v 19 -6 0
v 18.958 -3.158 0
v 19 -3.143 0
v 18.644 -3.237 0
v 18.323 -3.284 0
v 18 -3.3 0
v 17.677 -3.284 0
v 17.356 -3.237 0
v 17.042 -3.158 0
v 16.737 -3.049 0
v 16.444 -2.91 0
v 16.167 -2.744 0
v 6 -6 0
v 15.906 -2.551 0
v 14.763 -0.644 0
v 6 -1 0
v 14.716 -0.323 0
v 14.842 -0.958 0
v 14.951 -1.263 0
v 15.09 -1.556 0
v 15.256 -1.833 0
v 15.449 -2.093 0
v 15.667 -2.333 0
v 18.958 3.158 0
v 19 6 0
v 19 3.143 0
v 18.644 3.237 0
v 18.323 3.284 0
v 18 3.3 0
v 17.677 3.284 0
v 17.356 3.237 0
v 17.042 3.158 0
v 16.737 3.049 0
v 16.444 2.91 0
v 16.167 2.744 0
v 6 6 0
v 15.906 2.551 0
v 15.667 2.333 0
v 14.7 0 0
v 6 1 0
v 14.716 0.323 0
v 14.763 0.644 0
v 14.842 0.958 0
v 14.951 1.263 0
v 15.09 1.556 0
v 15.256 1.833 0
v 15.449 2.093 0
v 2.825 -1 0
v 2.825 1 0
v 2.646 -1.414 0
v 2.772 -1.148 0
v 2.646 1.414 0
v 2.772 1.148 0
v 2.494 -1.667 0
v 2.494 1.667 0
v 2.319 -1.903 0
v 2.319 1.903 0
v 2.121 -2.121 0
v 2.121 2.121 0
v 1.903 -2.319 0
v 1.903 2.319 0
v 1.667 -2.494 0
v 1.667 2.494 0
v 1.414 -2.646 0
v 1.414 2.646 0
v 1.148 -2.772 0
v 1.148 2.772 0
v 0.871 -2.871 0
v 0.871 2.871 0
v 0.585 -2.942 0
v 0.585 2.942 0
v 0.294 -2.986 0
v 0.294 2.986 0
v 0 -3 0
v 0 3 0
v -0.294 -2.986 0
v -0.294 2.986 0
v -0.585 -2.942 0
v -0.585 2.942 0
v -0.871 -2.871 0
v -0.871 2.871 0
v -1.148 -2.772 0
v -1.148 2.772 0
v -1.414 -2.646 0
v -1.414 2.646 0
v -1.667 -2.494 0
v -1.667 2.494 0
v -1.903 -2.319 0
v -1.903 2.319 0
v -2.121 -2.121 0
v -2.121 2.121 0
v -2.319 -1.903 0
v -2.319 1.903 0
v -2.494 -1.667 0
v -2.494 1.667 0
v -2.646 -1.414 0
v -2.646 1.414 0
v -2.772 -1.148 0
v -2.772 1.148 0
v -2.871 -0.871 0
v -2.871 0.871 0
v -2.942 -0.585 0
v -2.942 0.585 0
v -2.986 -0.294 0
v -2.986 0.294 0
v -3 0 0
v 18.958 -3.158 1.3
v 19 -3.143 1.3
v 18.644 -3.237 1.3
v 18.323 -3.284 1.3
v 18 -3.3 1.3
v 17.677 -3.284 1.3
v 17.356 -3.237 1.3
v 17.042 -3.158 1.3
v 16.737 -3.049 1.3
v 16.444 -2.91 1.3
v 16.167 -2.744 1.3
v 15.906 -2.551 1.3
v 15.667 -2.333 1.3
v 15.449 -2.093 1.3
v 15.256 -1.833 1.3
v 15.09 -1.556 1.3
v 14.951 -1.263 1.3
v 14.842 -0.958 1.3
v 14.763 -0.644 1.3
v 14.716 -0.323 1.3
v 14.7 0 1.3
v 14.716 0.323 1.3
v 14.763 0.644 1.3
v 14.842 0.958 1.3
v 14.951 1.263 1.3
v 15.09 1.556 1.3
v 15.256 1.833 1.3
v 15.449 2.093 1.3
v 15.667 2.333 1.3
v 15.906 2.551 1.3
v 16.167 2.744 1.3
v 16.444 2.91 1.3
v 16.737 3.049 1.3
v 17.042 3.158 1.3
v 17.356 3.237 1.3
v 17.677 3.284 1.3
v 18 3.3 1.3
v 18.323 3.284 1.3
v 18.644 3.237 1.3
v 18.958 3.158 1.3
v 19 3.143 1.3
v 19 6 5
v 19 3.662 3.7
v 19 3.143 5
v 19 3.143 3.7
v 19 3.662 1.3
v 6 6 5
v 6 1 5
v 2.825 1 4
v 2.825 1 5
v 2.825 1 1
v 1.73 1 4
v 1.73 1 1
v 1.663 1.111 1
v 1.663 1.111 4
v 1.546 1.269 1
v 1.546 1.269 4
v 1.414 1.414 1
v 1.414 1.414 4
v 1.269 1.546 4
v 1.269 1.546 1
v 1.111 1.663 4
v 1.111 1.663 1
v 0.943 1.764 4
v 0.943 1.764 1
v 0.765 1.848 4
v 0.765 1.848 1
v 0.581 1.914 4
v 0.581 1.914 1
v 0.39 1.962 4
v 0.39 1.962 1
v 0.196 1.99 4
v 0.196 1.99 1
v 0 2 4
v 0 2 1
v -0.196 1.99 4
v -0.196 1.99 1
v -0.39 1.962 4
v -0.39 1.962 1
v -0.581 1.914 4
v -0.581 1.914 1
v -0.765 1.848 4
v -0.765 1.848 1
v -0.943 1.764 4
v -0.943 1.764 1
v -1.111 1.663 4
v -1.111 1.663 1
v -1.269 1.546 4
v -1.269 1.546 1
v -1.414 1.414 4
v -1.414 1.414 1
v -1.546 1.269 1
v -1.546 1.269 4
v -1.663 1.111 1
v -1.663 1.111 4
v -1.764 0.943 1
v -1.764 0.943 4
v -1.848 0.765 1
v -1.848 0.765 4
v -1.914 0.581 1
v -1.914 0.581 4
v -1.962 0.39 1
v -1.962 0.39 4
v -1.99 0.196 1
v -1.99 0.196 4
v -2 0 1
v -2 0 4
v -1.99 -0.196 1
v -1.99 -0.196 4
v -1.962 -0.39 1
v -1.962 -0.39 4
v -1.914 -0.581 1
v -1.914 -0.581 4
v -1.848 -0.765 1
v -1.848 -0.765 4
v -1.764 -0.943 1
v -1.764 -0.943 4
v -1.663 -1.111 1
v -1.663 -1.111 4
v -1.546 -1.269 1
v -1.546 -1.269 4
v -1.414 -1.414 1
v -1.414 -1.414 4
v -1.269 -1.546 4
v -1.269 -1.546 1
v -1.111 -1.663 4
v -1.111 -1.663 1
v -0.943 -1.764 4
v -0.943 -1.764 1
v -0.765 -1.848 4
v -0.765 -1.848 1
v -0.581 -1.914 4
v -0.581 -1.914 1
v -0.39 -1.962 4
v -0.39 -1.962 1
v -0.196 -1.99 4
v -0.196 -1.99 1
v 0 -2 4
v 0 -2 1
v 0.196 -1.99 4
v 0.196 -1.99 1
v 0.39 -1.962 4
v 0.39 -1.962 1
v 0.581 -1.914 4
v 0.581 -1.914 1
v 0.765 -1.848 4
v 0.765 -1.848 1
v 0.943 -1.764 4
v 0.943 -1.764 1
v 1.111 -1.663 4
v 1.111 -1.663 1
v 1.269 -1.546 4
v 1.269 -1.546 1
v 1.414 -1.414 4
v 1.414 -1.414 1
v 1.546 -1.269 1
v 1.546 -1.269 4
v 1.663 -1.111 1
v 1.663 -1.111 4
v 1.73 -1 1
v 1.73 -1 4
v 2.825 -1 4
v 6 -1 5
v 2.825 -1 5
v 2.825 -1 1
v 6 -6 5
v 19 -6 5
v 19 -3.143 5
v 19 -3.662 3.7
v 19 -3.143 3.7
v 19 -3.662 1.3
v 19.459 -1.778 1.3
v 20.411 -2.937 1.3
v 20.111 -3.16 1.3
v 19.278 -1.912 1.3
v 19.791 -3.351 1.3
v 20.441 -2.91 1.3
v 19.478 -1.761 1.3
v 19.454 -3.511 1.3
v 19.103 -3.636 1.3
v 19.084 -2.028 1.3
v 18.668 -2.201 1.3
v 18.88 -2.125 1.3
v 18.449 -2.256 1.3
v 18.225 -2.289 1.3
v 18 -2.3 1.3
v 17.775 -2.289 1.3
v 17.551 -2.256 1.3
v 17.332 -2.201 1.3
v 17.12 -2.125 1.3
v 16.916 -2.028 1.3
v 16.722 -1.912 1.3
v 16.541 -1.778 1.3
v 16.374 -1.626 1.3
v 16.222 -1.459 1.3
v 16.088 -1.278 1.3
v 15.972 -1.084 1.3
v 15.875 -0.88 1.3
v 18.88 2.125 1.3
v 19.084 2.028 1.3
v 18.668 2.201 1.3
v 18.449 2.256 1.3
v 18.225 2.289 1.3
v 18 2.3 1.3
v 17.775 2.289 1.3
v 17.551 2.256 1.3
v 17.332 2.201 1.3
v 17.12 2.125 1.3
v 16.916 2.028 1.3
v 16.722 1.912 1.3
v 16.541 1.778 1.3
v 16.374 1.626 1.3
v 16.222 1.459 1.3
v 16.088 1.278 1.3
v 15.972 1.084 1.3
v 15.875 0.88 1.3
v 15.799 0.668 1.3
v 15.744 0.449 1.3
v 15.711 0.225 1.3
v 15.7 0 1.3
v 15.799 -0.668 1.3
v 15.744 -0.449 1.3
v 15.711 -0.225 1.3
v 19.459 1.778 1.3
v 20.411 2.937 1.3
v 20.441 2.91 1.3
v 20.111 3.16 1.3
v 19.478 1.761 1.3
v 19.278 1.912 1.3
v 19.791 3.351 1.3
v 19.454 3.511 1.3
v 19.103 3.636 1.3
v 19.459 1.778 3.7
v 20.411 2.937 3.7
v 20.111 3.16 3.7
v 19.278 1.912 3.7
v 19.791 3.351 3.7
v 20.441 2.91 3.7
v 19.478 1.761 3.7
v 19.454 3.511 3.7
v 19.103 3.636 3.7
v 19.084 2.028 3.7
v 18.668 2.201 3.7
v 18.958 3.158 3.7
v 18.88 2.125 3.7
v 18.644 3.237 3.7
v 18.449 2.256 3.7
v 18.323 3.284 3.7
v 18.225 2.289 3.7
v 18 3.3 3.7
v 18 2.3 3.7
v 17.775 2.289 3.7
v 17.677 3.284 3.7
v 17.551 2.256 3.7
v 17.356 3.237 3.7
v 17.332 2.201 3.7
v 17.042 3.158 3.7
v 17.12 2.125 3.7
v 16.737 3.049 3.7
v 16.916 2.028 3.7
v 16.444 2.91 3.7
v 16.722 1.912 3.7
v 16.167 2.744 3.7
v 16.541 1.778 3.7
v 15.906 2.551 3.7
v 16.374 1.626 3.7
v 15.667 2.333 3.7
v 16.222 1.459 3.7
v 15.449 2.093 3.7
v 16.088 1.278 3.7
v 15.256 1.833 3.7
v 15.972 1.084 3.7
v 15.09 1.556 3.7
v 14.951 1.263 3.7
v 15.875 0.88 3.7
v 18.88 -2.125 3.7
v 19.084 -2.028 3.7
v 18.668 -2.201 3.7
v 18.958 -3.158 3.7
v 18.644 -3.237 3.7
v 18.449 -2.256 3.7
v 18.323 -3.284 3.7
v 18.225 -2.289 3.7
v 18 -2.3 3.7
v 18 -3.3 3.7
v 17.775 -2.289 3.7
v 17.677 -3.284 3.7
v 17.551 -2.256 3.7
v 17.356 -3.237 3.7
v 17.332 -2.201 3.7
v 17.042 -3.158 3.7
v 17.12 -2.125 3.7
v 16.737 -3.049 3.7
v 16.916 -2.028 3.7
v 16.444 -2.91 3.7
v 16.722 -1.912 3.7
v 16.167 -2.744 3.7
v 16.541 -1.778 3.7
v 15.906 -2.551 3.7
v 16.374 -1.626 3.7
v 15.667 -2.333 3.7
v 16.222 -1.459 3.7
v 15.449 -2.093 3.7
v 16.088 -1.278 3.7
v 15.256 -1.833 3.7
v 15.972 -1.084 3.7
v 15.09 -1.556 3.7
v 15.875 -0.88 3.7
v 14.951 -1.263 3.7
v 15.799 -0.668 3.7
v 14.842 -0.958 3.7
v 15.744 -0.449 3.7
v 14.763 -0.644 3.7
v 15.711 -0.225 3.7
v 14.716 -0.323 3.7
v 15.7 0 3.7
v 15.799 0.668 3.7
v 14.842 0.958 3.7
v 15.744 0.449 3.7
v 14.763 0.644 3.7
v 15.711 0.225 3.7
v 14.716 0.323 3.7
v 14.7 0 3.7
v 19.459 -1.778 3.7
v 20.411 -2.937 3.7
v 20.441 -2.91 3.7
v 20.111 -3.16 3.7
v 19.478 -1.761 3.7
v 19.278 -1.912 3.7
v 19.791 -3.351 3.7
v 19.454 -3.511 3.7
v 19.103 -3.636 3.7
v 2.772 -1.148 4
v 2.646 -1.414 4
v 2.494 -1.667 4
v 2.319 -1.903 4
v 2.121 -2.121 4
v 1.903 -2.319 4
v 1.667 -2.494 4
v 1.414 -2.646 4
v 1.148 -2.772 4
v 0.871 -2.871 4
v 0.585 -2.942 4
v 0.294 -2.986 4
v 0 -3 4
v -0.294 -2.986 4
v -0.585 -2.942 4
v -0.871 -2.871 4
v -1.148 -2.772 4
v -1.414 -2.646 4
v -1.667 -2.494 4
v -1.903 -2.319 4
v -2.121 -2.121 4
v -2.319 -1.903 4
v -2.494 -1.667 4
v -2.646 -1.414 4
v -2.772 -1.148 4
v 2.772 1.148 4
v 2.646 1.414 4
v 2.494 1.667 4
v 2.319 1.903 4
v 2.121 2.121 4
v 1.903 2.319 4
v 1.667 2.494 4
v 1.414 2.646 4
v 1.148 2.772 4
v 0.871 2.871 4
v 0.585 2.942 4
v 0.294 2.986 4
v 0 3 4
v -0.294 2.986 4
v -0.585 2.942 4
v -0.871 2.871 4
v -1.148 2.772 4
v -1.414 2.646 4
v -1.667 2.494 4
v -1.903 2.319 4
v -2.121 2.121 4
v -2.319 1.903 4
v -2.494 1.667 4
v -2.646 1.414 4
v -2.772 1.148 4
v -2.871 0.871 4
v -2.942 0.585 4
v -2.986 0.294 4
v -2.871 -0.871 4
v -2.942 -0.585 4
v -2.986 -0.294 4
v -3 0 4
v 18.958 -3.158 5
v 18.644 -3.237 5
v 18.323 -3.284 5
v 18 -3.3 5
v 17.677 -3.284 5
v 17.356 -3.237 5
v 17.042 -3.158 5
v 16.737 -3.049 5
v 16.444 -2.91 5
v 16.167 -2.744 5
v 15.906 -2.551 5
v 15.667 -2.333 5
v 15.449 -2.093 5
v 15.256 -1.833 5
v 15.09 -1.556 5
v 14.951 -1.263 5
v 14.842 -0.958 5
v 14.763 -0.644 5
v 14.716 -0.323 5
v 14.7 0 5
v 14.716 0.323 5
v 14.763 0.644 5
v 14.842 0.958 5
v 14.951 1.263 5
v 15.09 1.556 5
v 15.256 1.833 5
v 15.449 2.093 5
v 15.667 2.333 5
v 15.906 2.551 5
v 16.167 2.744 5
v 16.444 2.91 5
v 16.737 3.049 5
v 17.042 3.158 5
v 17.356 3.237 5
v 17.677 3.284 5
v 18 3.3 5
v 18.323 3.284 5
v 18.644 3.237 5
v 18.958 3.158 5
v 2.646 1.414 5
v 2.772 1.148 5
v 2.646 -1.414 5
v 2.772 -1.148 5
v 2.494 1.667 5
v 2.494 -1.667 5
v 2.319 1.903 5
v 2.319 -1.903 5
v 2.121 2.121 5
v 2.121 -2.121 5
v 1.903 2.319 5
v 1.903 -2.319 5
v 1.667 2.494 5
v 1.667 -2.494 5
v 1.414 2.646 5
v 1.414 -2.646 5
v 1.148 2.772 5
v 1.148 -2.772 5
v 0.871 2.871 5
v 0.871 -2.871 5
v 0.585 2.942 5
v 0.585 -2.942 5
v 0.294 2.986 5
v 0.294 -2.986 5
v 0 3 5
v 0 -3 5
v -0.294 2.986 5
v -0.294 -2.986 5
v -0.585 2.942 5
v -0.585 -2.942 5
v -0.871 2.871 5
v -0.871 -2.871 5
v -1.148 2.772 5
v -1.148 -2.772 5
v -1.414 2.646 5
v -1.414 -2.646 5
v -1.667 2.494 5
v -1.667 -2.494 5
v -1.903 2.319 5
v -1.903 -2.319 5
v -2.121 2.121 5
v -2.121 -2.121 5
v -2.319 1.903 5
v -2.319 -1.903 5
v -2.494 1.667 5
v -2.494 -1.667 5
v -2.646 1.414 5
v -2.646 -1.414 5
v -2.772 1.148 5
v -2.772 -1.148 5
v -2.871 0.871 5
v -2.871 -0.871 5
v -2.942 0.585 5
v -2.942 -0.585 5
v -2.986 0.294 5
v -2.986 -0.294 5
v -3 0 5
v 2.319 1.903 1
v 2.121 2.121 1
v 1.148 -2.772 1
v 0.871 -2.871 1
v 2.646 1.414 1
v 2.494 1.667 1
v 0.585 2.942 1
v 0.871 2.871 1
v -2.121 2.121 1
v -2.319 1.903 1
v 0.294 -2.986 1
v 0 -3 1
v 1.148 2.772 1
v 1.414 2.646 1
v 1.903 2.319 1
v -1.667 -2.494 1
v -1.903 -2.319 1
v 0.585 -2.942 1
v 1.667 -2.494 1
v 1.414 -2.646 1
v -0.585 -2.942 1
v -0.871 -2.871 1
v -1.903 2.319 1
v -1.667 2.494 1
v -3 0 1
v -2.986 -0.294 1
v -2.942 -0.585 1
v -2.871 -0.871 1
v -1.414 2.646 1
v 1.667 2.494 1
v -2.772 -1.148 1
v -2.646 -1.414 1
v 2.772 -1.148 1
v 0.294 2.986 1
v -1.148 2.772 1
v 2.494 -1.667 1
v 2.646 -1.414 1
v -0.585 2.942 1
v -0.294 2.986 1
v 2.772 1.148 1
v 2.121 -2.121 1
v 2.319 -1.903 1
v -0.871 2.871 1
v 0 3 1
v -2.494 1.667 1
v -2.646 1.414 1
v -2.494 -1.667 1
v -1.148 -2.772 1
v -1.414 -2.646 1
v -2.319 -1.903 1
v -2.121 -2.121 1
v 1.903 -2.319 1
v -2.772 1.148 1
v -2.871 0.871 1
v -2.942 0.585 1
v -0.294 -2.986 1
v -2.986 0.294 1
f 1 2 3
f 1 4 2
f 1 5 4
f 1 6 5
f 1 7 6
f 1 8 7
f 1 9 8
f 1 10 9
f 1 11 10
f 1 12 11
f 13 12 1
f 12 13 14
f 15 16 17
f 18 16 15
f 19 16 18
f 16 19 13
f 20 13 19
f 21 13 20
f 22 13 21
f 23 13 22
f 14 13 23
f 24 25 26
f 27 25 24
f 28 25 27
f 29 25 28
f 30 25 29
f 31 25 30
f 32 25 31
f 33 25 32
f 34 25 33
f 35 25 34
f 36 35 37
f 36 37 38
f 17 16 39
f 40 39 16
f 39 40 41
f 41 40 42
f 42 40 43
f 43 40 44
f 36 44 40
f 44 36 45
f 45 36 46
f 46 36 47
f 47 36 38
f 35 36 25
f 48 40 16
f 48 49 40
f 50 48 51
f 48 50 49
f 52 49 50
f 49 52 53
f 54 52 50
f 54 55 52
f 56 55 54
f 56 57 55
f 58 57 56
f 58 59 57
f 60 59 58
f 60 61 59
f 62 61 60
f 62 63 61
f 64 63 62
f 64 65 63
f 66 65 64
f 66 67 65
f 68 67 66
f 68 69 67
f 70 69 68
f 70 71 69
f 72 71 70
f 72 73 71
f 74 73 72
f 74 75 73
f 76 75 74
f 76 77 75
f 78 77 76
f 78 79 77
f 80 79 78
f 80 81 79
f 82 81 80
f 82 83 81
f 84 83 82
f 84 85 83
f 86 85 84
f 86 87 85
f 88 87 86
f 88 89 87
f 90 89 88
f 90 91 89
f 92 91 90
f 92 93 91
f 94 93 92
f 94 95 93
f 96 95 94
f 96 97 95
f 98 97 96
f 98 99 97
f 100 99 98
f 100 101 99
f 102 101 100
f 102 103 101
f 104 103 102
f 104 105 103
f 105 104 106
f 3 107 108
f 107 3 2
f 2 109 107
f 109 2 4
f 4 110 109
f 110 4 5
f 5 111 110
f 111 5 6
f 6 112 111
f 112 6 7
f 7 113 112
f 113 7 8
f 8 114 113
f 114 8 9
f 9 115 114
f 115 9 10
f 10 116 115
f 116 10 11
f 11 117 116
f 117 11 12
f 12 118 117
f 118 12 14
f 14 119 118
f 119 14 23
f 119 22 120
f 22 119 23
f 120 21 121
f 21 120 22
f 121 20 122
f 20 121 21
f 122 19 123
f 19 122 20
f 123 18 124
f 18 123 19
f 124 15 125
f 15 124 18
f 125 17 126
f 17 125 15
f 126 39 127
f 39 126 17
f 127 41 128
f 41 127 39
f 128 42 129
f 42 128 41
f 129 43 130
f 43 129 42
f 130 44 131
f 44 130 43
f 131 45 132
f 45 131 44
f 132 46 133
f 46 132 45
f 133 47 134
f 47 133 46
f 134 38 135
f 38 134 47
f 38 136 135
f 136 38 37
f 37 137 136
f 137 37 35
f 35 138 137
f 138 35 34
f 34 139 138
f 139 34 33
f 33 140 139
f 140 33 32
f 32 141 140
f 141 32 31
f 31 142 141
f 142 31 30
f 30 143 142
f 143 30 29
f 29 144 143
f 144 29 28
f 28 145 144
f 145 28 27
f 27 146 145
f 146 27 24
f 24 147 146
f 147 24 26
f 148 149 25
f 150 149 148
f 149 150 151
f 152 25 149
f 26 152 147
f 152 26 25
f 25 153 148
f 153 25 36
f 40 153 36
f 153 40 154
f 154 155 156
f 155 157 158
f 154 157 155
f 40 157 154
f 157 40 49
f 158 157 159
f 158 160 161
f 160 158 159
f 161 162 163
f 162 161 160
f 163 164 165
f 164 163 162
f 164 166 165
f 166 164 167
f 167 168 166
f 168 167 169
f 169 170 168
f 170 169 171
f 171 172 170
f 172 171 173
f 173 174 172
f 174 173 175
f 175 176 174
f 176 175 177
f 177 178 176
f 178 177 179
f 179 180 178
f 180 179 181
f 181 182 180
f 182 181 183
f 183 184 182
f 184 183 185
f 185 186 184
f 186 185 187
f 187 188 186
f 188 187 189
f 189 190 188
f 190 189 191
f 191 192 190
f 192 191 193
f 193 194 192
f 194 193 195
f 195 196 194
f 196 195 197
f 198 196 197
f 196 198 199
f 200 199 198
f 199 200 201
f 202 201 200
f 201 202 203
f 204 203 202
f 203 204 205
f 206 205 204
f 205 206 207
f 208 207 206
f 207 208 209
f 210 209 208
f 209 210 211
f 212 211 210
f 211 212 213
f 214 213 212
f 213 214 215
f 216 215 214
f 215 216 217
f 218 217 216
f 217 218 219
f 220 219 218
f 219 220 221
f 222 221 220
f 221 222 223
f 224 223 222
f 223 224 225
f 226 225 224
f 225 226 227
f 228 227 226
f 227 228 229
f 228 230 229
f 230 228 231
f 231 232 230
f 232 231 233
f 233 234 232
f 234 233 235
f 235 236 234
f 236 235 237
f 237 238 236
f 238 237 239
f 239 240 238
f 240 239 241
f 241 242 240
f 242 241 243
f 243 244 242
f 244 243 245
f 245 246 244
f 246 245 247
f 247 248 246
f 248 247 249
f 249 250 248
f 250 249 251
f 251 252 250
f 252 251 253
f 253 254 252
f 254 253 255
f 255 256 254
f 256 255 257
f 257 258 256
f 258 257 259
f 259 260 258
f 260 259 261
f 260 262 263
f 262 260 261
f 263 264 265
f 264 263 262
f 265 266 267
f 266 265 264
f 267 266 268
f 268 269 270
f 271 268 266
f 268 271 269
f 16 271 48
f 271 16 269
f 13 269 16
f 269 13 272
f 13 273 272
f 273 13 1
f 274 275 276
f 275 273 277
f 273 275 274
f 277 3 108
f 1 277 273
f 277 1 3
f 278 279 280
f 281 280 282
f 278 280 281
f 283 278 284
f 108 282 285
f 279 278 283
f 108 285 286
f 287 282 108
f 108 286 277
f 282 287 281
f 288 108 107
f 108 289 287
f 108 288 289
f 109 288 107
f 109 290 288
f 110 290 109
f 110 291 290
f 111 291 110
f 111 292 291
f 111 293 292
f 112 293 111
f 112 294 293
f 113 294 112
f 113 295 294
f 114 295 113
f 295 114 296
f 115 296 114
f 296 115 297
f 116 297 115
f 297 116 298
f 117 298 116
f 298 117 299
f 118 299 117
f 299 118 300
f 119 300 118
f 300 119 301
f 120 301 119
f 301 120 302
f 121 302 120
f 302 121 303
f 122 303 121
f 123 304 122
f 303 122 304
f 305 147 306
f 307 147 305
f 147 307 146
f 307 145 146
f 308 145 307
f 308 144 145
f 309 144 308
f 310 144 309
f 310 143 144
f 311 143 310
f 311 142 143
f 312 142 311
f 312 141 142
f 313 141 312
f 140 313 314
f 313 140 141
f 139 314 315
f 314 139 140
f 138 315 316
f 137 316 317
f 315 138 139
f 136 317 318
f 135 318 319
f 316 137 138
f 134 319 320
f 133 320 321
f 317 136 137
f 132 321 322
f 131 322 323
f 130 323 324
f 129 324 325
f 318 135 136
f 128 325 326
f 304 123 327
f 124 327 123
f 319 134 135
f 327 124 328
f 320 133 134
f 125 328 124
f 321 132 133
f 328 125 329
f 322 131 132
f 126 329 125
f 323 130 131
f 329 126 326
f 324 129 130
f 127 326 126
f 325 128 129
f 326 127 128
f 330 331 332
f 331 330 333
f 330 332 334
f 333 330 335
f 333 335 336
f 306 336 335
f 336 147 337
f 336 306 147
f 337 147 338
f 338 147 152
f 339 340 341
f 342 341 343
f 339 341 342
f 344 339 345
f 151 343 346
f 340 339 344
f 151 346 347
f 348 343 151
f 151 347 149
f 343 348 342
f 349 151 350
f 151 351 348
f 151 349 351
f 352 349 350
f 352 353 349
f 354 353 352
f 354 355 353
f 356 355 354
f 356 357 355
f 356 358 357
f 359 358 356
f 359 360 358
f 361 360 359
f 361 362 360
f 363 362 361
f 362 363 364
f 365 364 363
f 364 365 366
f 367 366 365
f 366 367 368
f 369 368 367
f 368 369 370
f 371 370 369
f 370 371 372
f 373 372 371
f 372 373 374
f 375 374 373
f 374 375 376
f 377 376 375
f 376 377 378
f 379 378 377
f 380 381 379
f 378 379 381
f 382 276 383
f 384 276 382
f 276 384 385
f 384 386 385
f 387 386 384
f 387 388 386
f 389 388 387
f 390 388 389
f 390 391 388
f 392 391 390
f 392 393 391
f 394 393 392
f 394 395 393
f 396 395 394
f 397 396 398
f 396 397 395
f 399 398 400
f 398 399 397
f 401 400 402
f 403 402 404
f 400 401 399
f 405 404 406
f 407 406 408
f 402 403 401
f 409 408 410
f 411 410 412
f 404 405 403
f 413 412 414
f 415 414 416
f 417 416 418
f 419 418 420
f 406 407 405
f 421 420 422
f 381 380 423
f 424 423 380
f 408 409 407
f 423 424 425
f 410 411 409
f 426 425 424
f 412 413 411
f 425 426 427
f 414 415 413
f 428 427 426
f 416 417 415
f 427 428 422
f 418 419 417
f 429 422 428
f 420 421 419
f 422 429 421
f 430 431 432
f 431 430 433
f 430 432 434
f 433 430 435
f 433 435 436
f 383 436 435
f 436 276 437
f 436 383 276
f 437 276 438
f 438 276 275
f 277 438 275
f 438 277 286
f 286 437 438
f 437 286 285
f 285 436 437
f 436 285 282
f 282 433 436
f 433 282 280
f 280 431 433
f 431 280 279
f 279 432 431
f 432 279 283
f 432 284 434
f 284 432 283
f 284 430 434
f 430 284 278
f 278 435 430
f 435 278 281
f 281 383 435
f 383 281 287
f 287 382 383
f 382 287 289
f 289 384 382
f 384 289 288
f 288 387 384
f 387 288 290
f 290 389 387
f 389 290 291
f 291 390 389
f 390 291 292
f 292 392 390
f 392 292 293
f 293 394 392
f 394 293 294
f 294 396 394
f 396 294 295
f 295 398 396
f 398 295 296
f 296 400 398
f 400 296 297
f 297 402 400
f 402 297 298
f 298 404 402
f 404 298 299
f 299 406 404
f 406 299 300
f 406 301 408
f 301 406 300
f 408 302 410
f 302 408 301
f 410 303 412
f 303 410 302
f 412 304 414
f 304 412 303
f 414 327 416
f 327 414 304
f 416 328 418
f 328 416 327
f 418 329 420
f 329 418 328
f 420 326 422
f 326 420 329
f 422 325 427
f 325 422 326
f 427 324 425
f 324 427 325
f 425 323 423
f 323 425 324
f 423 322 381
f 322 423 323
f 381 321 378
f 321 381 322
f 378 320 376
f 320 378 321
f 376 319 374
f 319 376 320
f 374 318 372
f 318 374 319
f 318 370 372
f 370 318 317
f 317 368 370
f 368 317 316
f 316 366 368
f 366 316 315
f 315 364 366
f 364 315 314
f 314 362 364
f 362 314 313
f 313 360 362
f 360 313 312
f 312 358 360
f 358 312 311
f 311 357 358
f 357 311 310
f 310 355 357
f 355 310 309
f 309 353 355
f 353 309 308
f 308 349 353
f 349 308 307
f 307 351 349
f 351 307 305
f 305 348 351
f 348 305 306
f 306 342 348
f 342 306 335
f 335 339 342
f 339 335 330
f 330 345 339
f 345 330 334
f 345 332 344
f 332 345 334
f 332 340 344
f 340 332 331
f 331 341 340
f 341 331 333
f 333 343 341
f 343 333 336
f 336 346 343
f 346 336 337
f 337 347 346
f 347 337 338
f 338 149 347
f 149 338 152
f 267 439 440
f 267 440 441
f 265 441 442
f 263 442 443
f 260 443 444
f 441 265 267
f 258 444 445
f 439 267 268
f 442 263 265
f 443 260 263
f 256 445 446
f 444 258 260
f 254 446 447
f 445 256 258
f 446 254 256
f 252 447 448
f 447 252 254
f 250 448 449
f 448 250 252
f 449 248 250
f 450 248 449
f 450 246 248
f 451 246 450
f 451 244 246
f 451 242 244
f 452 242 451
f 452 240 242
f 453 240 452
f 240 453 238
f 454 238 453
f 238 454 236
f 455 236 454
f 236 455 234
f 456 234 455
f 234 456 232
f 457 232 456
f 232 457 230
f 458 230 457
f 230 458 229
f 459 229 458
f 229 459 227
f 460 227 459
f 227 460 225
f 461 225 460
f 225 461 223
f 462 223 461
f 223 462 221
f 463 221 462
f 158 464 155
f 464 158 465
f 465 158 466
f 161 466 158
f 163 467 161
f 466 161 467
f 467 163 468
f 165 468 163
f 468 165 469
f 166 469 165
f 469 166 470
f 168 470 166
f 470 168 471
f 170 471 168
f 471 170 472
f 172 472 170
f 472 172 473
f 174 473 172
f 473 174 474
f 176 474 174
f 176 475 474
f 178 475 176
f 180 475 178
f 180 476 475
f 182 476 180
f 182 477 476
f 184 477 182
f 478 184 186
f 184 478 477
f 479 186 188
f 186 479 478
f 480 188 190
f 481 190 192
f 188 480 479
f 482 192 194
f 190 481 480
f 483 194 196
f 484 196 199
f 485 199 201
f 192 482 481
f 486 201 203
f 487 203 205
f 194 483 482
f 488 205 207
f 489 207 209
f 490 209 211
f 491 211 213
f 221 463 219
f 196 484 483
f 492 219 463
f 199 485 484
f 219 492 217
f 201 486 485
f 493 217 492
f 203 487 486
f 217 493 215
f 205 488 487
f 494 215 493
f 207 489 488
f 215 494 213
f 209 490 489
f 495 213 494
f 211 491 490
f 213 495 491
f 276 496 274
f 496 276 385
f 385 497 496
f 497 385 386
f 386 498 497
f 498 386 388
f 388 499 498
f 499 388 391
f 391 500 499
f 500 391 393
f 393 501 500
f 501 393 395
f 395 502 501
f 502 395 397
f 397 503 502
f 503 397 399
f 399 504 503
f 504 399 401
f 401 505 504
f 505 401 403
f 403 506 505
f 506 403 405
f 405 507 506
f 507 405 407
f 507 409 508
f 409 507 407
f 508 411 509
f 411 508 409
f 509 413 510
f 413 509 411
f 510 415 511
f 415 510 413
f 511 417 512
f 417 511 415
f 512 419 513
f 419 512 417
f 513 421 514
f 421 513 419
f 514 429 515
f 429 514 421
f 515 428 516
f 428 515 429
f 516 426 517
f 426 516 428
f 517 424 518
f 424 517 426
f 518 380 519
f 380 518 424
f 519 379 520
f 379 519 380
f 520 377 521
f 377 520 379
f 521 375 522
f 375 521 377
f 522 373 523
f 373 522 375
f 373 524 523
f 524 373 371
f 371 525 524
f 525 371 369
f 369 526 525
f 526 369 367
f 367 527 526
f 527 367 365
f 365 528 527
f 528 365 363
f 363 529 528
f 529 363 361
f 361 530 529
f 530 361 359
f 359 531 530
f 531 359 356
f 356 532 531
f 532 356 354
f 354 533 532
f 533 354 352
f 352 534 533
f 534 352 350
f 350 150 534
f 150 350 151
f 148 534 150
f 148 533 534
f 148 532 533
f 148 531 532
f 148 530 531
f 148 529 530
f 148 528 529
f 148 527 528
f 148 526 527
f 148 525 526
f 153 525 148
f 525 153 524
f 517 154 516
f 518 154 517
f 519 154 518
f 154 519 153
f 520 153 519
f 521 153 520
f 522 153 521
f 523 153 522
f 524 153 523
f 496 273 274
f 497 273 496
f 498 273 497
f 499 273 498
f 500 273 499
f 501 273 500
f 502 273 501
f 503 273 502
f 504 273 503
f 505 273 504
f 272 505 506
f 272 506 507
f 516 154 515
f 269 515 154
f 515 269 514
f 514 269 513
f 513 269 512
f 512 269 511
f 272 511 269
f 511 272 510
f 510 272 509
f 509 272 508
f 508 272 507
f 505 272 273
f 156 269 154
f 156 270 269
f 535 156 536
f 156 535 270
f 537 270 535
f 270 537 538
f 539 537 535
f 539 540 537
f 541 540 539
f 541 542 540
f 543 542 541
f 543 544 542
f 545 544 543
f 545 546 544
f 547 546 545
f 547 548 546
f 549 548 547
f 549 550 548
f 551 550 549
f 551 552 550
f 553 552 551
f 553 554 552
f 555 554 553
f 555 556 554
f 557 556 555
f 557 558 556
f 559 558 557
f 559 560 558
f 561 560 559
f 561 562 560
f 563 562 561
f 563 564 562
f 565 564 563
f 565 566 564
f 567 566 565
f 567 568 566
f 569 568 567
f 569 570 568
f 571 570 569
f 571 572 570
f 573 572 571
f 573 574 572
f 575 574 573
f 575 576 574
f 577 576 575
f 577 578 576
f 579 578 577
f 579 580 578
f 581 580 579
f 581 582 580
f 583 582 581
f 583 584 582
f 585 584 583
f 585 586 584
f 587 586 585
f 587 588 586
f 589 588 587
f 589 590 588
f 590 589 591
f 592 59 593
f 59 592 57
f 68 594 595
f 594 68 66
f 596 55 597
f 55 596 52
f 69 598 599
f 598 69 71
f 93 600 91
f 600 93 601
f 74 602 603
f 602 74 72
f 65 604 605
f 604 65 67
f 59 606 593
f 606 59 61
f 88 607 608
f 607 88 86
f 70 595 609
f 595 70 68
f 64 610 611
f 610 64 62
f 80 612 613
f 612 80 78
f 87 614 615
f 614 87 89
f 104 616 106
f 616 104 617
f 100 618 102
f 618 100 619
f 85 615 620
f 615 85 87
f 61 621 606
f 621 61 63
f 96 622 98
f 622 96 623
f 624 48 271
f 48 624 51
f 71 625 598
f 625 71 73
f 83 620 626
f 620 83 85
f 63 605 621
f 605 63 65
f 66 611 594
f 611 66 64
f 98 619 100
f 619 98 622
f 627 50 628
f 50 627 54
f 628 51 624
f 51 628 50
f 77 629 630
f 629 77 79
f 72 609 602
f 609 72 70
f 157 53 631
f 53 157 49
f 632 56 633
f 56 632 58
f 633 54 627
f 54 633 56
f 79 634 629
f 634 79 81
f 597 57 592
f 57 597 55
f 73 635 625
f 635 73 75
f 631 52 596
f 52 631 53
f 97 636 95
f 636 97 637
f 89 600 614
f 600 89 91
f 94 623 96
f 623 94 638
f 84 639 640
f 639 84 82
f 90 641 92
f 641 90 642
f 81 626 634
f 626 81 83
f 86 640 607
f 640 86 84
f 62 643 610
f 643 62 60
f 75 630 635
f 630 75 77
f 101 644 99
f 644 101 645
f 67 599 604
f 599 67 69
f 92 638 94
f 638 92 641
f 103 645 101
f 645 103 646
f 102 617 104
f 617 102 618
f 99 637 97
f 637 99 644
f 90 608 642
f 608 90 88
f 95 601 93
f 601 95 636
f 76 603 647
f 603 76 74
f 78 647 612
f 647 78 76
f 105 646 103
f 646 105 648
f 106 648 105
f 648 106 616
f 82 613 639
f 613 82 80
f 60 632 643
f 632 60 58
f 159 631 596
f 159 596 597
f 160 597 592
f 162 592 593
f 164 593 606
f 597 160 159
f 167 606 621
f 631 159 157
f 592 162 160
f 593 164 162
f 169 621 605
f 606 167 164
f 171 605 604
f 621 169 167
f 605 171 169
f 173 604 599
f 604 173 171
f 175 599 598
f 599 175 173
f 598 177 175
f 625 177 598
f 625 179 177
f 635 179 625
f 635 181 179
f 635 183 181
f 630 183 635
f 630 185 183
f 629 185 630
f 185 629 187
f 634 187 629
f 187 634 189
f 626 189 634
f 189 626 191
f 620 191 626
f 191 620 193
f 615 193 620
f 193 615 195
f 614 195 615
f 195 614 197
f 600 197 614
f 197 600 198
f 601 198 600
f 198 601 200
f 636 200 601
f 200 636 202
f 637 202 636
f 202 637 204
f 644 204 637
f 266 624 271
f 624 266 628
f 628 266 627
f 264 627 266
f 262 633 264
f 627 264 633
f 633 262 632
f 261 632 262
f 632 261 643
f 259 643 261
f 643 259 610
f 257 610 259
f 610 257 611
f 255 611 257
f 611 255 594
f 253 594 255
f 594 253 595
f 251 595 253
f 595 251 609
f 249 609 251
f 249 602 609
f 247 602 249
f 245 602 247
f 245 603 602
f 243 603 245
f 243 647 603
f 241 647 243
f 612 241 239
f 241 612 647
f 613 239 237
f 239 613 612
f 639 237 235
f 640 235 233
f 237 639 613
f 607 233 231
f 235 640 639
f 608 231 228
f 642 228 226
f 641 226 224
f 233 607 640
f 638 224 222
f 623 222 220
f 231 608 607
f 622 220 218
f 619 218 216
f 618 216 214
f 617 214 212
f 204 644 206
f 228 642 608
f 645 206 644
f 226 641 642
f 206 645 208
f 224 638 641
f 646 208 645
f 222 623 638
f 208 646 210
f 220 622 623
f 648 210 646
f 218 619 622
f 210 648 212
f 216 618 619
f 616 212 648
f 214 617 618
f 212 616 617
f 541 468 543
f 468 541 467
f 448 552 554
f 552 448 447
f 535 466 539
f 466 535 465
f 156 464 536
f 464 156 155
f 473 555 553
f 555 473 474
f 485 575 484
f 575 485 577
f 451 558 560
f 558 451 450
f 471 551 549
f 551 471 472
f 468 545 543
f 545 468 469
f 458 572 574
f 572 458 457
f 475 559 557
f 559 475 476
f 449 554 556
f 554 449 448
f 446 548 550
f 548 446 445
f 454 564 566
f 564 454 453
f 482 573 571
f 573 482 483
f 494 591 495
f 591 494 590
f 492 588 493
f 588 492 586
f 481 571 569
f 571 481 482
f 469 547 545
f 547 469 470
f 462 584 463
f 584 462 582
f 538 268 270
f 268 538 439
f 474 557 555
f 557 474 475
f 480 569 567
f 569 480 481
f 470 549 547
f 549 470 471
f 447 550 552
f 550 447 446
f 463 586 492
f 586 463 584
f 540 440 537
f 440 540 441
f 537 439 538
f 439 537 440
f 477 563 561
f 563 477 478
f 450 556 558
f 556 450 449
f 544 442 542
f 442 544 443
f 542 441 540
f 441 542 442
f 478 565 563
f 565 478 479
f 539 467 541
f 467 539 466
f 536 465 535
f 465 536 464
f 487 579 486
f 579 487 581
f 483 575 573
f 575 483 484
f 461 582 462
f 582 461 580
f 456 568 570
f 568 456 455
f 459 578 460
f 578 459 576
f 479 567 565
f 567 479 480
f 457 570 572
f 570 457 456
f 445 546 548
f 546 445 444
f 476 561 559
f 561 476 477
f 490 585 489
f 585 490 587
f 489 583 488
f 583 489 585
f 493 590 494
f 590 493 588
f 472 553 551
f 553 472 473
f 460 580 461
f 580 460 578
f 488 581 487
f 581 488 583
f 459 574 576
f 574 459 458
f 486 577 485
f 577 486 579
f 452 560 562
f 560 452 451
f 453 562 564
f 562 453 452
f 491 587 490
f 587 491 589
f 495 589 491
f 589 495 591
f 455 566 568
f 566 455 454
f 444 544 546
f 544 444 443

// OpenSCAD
part = "link"; // [link, assembly]
cadverify_only = "";
module instance(name, part, unit = 1) {
    echo(cadverify_instance = [name, part, unit]);
    if (cadverify_only == "" || cadverify_only == name) children();
}

// Parameters (mm)
pitch = 18;          // pin-to-bore distance (10 links = 180mm)
link_w = 12;         // width (Y)
link_t = 5;          // thickness (Z)
pin_d = 4;           // pin shaft diameter
bore_d = 4.6;        // bore diameter (0.3 radial clearance)
cap_d = 6;           // cap diameter
cap_h = 1;           // cap thickness
gap_z = 0.3;         // vertical clearance cap<->knuckle
kn_out_d = 7.6;      // knuckle outer diameter (1.5 wall)
cap_cav_d = 6.6;     // cap cavity diameter (0.3 radial clearance)
neck_w = 2;          // neck width
slot_half = 50;      // slot half-angle (deg), allows +-30 deg swing
yoke_west = 6;       // yoke west edge (local X)
yoke_east = 19;      // yoke east extent (local X, 1.0 past bore)
$fn = 64;

module link_geom() {
    bore_x = pitch;
    pin_r = pin_d/2;
    bore_r = bore_d/2;
    kn_out_r = kn_out_d/2;
    cav_r = cap_cav_d/2;
    cap_r = cap_d/2;
    wedge_far = 30;
    dy_far = wedge_far * tan(slot_half);
    bot_h = cap_h;            // 0..1
    gap_h = gap_z;            // 0.3
    kn_h = link_t - 2*cap_h - 2*gap_h; // 2.4 (1.3..3.7)
    // bottom (0..1): pin+neck+yoke minus cap cavity minus slot
    translate([0,0,0]) linear_extrude(height = bot_h, convexity = 8) {
        difference() {
            union() {
                circle(r = pin_r);
                translate([0,-neck_w/2]) square([yoke_west+1, neck_w]);
                translate([yoke_west,-link_w/2]) square([yoke_east-yoke_west, link_w]);
            }
            translate([bore_x,0]) circle(r = cav_r);
            polygon(points = [[bore_x,0],[bore_x+wedge_far, dy_far],[bore_x+wedge_far, -dy_far]]);
        }
    }
    // lower gap (1..1.3): same footprint
    translate([0,0,bot_h]) linear_extrude(height = gap_h, convexity = 8) {
        difference() {
            union() {
                circle(r = pin_r);
                translate([0,-neck_w/2]) square([yoke_west+1, neck_w]);
                translate([yoke_west,-link_w/2]) square([yoke_east-yoke_west, link_w]);
            }
            translate([bore_x,0]) circle(r = cav_r);
            polygon(points = [[bore_x,0],[bore_x+wedge_far, dy_far],[bore_x+wedge_far, -dy_far]]);
        }
    }
    // middle knuckle zone (1.3..3.7)
    translate([0,0,bot_h+gap_h]) linear_extrude(height = kn_h, convexity = 8) {
        difference() {
            union() {
                circle(r = pin_r);
                translate([0,-neck_w/2]) square([yoke_west+1, neck_w]);
                translate([yoke_west,-link_w/2]) square([yoke_east-yoke_west, link_w]);
                translate([bore_x,0]) circle(r = kn_out_r);
            }
            translate([bore_x,0]) circle(r = bore_r);
            polygon(points = [[bore_x,0],[bore_x+wedge_far, dy_far],[bore_x+wedge_far, -dy_far]]);
        }
    }
    // upper gap (3.7..4)
    translate([0,0,bot_h+gap_h+kn_h]) linear_extrude(height = gap_h, convexity = 8) {
        difference() {
            union() {
                circle(r = pin_r);
                translate([0,-neck_w/2]) square([yoke_west+1, neck_w]);
                translate([yoke_west,-link_w/2]) square([yoke_east-yoke_west, link_w]);
            }
            translate([bore_x,0]) circle(r = cav_r);
            polygon(points = [[bore_x,0],[bore_x+wedge_far, dy_far],[bore_x+wedge_far, -dy_far]]);
        }
    }
    // top (4..5)
    translate([0,0,bot_h+gap_h+kn_h+gap_h]) linear_extrude(height = bot_h, convexity = 8) {
        difference() {
            union() {
                circle(r = pin_r);
                translate([0,-neck_w/2]) square([yoke_west+1, neck_w]);
                translate([yoke_west,-link_w/2]) square([yoke_east-yoke_west, link_w]);
            }
            translate([bore_x,0]) circle(r = cav_r);
            polygon(points = [[bore_x,0],[bore_x+wedge_far, dy_far],[bore_x+wedge_far, -dy_far]]);
        }
    }
    // caps (pin ends)
    translate([0,0,0]) cylinder(h = cap_h, r = cap_r);
    translate([0,0,link_t-cap_h]) cylinder(h = cap_h, r = cap_r);
}

if (part == "assembly") {
    instance("link1", "link", 1) translate([0,0,0]) link_geom();
    instance("link2", "link", 1) translate([18,0,0]) link_geom();
    instance("link3", "link", 1) translate([36,0,0]) link_geom();
    echo(cadverify_spec = [
        ["bounds", [[-3, -6, 0], [57.8, 6, 5]]],
        ["support_faces", [["bed", "-z", 200]]],
        ["motions", [
            ["bend", ["link3"], "rotate", [36, 0, 0], [0, 0, 1], [-30, 30]]
        ]],
        ["assembly_order", [
            [["link1", "link2", "link3"], [0, 0, 0]]
        ]],
        ["print_in_place", 0.3],
        ["overhangs_allowed", [
            ["pin cap link1", [[-3, -3, 3.8], [3, 3, 4.2]]],
            ["knuckle joint1", [[14, -4, 1.0], [22, 4, 1.6]]],
            ["pin cap link2", [[15, -3, 3.8], [21, 3, 4.2]]],
            ["knuckle joint2", [[32, -4, 1.0], [40, 4, 1.6]]],
            ["pin cap link3", [[33, -3, 3.8], [39, 3, 4.2]]],
            ["knuckle end", [[50, -4, 1.0], [58, 4, 1.6]]]
        ]],
        ["held", ["link1", "link2", "link3"]]
    ]);
} else {
    link_geom();
    echo(cadverify_spec = [
        ["bounds", [[-3, -6, 0], [20.5, 6, 5]]],
        ["bodies", 1],
        ["through_holes", 0],
        ["support_faces", [["bed", "-z", 100]]],
        ["overhangs_allowed", [
            ["pin cap", [[-3, -3, 3.8], [3, 3, 4.2]]],
            ["knuckle ceiling", [[14, -4, 1.0], [22, 4, 1.6]]]
        ]],
        ["copies", 3],
        ["details", [
            ["body", "material", [[6, -6, 0], [14, 6, 5]], 0.85],
            ["neck", "material", [[0, -1, 0], [7, 1, 5]], 0.8],
            ["knuckle", "material", [[14.2, -3.8, 1.3], [21.8, 3.8, 3.7]], 0.25],
            ["slot", "void", [[19, -1, 0], [21, 1, 5]], 0.8],
            ["cap_cavity", "void", [[14.7, -3.3, 0], [21.3, 3.3, 1]], 0.5],
            ["wall", "thickness", [18, 7, 2.5], [0, -1, 0], 3.7],
            ["floor", "thickness", [9, 0, -1], [0, 0, 1], 5]
        ]]
    ]);
}
